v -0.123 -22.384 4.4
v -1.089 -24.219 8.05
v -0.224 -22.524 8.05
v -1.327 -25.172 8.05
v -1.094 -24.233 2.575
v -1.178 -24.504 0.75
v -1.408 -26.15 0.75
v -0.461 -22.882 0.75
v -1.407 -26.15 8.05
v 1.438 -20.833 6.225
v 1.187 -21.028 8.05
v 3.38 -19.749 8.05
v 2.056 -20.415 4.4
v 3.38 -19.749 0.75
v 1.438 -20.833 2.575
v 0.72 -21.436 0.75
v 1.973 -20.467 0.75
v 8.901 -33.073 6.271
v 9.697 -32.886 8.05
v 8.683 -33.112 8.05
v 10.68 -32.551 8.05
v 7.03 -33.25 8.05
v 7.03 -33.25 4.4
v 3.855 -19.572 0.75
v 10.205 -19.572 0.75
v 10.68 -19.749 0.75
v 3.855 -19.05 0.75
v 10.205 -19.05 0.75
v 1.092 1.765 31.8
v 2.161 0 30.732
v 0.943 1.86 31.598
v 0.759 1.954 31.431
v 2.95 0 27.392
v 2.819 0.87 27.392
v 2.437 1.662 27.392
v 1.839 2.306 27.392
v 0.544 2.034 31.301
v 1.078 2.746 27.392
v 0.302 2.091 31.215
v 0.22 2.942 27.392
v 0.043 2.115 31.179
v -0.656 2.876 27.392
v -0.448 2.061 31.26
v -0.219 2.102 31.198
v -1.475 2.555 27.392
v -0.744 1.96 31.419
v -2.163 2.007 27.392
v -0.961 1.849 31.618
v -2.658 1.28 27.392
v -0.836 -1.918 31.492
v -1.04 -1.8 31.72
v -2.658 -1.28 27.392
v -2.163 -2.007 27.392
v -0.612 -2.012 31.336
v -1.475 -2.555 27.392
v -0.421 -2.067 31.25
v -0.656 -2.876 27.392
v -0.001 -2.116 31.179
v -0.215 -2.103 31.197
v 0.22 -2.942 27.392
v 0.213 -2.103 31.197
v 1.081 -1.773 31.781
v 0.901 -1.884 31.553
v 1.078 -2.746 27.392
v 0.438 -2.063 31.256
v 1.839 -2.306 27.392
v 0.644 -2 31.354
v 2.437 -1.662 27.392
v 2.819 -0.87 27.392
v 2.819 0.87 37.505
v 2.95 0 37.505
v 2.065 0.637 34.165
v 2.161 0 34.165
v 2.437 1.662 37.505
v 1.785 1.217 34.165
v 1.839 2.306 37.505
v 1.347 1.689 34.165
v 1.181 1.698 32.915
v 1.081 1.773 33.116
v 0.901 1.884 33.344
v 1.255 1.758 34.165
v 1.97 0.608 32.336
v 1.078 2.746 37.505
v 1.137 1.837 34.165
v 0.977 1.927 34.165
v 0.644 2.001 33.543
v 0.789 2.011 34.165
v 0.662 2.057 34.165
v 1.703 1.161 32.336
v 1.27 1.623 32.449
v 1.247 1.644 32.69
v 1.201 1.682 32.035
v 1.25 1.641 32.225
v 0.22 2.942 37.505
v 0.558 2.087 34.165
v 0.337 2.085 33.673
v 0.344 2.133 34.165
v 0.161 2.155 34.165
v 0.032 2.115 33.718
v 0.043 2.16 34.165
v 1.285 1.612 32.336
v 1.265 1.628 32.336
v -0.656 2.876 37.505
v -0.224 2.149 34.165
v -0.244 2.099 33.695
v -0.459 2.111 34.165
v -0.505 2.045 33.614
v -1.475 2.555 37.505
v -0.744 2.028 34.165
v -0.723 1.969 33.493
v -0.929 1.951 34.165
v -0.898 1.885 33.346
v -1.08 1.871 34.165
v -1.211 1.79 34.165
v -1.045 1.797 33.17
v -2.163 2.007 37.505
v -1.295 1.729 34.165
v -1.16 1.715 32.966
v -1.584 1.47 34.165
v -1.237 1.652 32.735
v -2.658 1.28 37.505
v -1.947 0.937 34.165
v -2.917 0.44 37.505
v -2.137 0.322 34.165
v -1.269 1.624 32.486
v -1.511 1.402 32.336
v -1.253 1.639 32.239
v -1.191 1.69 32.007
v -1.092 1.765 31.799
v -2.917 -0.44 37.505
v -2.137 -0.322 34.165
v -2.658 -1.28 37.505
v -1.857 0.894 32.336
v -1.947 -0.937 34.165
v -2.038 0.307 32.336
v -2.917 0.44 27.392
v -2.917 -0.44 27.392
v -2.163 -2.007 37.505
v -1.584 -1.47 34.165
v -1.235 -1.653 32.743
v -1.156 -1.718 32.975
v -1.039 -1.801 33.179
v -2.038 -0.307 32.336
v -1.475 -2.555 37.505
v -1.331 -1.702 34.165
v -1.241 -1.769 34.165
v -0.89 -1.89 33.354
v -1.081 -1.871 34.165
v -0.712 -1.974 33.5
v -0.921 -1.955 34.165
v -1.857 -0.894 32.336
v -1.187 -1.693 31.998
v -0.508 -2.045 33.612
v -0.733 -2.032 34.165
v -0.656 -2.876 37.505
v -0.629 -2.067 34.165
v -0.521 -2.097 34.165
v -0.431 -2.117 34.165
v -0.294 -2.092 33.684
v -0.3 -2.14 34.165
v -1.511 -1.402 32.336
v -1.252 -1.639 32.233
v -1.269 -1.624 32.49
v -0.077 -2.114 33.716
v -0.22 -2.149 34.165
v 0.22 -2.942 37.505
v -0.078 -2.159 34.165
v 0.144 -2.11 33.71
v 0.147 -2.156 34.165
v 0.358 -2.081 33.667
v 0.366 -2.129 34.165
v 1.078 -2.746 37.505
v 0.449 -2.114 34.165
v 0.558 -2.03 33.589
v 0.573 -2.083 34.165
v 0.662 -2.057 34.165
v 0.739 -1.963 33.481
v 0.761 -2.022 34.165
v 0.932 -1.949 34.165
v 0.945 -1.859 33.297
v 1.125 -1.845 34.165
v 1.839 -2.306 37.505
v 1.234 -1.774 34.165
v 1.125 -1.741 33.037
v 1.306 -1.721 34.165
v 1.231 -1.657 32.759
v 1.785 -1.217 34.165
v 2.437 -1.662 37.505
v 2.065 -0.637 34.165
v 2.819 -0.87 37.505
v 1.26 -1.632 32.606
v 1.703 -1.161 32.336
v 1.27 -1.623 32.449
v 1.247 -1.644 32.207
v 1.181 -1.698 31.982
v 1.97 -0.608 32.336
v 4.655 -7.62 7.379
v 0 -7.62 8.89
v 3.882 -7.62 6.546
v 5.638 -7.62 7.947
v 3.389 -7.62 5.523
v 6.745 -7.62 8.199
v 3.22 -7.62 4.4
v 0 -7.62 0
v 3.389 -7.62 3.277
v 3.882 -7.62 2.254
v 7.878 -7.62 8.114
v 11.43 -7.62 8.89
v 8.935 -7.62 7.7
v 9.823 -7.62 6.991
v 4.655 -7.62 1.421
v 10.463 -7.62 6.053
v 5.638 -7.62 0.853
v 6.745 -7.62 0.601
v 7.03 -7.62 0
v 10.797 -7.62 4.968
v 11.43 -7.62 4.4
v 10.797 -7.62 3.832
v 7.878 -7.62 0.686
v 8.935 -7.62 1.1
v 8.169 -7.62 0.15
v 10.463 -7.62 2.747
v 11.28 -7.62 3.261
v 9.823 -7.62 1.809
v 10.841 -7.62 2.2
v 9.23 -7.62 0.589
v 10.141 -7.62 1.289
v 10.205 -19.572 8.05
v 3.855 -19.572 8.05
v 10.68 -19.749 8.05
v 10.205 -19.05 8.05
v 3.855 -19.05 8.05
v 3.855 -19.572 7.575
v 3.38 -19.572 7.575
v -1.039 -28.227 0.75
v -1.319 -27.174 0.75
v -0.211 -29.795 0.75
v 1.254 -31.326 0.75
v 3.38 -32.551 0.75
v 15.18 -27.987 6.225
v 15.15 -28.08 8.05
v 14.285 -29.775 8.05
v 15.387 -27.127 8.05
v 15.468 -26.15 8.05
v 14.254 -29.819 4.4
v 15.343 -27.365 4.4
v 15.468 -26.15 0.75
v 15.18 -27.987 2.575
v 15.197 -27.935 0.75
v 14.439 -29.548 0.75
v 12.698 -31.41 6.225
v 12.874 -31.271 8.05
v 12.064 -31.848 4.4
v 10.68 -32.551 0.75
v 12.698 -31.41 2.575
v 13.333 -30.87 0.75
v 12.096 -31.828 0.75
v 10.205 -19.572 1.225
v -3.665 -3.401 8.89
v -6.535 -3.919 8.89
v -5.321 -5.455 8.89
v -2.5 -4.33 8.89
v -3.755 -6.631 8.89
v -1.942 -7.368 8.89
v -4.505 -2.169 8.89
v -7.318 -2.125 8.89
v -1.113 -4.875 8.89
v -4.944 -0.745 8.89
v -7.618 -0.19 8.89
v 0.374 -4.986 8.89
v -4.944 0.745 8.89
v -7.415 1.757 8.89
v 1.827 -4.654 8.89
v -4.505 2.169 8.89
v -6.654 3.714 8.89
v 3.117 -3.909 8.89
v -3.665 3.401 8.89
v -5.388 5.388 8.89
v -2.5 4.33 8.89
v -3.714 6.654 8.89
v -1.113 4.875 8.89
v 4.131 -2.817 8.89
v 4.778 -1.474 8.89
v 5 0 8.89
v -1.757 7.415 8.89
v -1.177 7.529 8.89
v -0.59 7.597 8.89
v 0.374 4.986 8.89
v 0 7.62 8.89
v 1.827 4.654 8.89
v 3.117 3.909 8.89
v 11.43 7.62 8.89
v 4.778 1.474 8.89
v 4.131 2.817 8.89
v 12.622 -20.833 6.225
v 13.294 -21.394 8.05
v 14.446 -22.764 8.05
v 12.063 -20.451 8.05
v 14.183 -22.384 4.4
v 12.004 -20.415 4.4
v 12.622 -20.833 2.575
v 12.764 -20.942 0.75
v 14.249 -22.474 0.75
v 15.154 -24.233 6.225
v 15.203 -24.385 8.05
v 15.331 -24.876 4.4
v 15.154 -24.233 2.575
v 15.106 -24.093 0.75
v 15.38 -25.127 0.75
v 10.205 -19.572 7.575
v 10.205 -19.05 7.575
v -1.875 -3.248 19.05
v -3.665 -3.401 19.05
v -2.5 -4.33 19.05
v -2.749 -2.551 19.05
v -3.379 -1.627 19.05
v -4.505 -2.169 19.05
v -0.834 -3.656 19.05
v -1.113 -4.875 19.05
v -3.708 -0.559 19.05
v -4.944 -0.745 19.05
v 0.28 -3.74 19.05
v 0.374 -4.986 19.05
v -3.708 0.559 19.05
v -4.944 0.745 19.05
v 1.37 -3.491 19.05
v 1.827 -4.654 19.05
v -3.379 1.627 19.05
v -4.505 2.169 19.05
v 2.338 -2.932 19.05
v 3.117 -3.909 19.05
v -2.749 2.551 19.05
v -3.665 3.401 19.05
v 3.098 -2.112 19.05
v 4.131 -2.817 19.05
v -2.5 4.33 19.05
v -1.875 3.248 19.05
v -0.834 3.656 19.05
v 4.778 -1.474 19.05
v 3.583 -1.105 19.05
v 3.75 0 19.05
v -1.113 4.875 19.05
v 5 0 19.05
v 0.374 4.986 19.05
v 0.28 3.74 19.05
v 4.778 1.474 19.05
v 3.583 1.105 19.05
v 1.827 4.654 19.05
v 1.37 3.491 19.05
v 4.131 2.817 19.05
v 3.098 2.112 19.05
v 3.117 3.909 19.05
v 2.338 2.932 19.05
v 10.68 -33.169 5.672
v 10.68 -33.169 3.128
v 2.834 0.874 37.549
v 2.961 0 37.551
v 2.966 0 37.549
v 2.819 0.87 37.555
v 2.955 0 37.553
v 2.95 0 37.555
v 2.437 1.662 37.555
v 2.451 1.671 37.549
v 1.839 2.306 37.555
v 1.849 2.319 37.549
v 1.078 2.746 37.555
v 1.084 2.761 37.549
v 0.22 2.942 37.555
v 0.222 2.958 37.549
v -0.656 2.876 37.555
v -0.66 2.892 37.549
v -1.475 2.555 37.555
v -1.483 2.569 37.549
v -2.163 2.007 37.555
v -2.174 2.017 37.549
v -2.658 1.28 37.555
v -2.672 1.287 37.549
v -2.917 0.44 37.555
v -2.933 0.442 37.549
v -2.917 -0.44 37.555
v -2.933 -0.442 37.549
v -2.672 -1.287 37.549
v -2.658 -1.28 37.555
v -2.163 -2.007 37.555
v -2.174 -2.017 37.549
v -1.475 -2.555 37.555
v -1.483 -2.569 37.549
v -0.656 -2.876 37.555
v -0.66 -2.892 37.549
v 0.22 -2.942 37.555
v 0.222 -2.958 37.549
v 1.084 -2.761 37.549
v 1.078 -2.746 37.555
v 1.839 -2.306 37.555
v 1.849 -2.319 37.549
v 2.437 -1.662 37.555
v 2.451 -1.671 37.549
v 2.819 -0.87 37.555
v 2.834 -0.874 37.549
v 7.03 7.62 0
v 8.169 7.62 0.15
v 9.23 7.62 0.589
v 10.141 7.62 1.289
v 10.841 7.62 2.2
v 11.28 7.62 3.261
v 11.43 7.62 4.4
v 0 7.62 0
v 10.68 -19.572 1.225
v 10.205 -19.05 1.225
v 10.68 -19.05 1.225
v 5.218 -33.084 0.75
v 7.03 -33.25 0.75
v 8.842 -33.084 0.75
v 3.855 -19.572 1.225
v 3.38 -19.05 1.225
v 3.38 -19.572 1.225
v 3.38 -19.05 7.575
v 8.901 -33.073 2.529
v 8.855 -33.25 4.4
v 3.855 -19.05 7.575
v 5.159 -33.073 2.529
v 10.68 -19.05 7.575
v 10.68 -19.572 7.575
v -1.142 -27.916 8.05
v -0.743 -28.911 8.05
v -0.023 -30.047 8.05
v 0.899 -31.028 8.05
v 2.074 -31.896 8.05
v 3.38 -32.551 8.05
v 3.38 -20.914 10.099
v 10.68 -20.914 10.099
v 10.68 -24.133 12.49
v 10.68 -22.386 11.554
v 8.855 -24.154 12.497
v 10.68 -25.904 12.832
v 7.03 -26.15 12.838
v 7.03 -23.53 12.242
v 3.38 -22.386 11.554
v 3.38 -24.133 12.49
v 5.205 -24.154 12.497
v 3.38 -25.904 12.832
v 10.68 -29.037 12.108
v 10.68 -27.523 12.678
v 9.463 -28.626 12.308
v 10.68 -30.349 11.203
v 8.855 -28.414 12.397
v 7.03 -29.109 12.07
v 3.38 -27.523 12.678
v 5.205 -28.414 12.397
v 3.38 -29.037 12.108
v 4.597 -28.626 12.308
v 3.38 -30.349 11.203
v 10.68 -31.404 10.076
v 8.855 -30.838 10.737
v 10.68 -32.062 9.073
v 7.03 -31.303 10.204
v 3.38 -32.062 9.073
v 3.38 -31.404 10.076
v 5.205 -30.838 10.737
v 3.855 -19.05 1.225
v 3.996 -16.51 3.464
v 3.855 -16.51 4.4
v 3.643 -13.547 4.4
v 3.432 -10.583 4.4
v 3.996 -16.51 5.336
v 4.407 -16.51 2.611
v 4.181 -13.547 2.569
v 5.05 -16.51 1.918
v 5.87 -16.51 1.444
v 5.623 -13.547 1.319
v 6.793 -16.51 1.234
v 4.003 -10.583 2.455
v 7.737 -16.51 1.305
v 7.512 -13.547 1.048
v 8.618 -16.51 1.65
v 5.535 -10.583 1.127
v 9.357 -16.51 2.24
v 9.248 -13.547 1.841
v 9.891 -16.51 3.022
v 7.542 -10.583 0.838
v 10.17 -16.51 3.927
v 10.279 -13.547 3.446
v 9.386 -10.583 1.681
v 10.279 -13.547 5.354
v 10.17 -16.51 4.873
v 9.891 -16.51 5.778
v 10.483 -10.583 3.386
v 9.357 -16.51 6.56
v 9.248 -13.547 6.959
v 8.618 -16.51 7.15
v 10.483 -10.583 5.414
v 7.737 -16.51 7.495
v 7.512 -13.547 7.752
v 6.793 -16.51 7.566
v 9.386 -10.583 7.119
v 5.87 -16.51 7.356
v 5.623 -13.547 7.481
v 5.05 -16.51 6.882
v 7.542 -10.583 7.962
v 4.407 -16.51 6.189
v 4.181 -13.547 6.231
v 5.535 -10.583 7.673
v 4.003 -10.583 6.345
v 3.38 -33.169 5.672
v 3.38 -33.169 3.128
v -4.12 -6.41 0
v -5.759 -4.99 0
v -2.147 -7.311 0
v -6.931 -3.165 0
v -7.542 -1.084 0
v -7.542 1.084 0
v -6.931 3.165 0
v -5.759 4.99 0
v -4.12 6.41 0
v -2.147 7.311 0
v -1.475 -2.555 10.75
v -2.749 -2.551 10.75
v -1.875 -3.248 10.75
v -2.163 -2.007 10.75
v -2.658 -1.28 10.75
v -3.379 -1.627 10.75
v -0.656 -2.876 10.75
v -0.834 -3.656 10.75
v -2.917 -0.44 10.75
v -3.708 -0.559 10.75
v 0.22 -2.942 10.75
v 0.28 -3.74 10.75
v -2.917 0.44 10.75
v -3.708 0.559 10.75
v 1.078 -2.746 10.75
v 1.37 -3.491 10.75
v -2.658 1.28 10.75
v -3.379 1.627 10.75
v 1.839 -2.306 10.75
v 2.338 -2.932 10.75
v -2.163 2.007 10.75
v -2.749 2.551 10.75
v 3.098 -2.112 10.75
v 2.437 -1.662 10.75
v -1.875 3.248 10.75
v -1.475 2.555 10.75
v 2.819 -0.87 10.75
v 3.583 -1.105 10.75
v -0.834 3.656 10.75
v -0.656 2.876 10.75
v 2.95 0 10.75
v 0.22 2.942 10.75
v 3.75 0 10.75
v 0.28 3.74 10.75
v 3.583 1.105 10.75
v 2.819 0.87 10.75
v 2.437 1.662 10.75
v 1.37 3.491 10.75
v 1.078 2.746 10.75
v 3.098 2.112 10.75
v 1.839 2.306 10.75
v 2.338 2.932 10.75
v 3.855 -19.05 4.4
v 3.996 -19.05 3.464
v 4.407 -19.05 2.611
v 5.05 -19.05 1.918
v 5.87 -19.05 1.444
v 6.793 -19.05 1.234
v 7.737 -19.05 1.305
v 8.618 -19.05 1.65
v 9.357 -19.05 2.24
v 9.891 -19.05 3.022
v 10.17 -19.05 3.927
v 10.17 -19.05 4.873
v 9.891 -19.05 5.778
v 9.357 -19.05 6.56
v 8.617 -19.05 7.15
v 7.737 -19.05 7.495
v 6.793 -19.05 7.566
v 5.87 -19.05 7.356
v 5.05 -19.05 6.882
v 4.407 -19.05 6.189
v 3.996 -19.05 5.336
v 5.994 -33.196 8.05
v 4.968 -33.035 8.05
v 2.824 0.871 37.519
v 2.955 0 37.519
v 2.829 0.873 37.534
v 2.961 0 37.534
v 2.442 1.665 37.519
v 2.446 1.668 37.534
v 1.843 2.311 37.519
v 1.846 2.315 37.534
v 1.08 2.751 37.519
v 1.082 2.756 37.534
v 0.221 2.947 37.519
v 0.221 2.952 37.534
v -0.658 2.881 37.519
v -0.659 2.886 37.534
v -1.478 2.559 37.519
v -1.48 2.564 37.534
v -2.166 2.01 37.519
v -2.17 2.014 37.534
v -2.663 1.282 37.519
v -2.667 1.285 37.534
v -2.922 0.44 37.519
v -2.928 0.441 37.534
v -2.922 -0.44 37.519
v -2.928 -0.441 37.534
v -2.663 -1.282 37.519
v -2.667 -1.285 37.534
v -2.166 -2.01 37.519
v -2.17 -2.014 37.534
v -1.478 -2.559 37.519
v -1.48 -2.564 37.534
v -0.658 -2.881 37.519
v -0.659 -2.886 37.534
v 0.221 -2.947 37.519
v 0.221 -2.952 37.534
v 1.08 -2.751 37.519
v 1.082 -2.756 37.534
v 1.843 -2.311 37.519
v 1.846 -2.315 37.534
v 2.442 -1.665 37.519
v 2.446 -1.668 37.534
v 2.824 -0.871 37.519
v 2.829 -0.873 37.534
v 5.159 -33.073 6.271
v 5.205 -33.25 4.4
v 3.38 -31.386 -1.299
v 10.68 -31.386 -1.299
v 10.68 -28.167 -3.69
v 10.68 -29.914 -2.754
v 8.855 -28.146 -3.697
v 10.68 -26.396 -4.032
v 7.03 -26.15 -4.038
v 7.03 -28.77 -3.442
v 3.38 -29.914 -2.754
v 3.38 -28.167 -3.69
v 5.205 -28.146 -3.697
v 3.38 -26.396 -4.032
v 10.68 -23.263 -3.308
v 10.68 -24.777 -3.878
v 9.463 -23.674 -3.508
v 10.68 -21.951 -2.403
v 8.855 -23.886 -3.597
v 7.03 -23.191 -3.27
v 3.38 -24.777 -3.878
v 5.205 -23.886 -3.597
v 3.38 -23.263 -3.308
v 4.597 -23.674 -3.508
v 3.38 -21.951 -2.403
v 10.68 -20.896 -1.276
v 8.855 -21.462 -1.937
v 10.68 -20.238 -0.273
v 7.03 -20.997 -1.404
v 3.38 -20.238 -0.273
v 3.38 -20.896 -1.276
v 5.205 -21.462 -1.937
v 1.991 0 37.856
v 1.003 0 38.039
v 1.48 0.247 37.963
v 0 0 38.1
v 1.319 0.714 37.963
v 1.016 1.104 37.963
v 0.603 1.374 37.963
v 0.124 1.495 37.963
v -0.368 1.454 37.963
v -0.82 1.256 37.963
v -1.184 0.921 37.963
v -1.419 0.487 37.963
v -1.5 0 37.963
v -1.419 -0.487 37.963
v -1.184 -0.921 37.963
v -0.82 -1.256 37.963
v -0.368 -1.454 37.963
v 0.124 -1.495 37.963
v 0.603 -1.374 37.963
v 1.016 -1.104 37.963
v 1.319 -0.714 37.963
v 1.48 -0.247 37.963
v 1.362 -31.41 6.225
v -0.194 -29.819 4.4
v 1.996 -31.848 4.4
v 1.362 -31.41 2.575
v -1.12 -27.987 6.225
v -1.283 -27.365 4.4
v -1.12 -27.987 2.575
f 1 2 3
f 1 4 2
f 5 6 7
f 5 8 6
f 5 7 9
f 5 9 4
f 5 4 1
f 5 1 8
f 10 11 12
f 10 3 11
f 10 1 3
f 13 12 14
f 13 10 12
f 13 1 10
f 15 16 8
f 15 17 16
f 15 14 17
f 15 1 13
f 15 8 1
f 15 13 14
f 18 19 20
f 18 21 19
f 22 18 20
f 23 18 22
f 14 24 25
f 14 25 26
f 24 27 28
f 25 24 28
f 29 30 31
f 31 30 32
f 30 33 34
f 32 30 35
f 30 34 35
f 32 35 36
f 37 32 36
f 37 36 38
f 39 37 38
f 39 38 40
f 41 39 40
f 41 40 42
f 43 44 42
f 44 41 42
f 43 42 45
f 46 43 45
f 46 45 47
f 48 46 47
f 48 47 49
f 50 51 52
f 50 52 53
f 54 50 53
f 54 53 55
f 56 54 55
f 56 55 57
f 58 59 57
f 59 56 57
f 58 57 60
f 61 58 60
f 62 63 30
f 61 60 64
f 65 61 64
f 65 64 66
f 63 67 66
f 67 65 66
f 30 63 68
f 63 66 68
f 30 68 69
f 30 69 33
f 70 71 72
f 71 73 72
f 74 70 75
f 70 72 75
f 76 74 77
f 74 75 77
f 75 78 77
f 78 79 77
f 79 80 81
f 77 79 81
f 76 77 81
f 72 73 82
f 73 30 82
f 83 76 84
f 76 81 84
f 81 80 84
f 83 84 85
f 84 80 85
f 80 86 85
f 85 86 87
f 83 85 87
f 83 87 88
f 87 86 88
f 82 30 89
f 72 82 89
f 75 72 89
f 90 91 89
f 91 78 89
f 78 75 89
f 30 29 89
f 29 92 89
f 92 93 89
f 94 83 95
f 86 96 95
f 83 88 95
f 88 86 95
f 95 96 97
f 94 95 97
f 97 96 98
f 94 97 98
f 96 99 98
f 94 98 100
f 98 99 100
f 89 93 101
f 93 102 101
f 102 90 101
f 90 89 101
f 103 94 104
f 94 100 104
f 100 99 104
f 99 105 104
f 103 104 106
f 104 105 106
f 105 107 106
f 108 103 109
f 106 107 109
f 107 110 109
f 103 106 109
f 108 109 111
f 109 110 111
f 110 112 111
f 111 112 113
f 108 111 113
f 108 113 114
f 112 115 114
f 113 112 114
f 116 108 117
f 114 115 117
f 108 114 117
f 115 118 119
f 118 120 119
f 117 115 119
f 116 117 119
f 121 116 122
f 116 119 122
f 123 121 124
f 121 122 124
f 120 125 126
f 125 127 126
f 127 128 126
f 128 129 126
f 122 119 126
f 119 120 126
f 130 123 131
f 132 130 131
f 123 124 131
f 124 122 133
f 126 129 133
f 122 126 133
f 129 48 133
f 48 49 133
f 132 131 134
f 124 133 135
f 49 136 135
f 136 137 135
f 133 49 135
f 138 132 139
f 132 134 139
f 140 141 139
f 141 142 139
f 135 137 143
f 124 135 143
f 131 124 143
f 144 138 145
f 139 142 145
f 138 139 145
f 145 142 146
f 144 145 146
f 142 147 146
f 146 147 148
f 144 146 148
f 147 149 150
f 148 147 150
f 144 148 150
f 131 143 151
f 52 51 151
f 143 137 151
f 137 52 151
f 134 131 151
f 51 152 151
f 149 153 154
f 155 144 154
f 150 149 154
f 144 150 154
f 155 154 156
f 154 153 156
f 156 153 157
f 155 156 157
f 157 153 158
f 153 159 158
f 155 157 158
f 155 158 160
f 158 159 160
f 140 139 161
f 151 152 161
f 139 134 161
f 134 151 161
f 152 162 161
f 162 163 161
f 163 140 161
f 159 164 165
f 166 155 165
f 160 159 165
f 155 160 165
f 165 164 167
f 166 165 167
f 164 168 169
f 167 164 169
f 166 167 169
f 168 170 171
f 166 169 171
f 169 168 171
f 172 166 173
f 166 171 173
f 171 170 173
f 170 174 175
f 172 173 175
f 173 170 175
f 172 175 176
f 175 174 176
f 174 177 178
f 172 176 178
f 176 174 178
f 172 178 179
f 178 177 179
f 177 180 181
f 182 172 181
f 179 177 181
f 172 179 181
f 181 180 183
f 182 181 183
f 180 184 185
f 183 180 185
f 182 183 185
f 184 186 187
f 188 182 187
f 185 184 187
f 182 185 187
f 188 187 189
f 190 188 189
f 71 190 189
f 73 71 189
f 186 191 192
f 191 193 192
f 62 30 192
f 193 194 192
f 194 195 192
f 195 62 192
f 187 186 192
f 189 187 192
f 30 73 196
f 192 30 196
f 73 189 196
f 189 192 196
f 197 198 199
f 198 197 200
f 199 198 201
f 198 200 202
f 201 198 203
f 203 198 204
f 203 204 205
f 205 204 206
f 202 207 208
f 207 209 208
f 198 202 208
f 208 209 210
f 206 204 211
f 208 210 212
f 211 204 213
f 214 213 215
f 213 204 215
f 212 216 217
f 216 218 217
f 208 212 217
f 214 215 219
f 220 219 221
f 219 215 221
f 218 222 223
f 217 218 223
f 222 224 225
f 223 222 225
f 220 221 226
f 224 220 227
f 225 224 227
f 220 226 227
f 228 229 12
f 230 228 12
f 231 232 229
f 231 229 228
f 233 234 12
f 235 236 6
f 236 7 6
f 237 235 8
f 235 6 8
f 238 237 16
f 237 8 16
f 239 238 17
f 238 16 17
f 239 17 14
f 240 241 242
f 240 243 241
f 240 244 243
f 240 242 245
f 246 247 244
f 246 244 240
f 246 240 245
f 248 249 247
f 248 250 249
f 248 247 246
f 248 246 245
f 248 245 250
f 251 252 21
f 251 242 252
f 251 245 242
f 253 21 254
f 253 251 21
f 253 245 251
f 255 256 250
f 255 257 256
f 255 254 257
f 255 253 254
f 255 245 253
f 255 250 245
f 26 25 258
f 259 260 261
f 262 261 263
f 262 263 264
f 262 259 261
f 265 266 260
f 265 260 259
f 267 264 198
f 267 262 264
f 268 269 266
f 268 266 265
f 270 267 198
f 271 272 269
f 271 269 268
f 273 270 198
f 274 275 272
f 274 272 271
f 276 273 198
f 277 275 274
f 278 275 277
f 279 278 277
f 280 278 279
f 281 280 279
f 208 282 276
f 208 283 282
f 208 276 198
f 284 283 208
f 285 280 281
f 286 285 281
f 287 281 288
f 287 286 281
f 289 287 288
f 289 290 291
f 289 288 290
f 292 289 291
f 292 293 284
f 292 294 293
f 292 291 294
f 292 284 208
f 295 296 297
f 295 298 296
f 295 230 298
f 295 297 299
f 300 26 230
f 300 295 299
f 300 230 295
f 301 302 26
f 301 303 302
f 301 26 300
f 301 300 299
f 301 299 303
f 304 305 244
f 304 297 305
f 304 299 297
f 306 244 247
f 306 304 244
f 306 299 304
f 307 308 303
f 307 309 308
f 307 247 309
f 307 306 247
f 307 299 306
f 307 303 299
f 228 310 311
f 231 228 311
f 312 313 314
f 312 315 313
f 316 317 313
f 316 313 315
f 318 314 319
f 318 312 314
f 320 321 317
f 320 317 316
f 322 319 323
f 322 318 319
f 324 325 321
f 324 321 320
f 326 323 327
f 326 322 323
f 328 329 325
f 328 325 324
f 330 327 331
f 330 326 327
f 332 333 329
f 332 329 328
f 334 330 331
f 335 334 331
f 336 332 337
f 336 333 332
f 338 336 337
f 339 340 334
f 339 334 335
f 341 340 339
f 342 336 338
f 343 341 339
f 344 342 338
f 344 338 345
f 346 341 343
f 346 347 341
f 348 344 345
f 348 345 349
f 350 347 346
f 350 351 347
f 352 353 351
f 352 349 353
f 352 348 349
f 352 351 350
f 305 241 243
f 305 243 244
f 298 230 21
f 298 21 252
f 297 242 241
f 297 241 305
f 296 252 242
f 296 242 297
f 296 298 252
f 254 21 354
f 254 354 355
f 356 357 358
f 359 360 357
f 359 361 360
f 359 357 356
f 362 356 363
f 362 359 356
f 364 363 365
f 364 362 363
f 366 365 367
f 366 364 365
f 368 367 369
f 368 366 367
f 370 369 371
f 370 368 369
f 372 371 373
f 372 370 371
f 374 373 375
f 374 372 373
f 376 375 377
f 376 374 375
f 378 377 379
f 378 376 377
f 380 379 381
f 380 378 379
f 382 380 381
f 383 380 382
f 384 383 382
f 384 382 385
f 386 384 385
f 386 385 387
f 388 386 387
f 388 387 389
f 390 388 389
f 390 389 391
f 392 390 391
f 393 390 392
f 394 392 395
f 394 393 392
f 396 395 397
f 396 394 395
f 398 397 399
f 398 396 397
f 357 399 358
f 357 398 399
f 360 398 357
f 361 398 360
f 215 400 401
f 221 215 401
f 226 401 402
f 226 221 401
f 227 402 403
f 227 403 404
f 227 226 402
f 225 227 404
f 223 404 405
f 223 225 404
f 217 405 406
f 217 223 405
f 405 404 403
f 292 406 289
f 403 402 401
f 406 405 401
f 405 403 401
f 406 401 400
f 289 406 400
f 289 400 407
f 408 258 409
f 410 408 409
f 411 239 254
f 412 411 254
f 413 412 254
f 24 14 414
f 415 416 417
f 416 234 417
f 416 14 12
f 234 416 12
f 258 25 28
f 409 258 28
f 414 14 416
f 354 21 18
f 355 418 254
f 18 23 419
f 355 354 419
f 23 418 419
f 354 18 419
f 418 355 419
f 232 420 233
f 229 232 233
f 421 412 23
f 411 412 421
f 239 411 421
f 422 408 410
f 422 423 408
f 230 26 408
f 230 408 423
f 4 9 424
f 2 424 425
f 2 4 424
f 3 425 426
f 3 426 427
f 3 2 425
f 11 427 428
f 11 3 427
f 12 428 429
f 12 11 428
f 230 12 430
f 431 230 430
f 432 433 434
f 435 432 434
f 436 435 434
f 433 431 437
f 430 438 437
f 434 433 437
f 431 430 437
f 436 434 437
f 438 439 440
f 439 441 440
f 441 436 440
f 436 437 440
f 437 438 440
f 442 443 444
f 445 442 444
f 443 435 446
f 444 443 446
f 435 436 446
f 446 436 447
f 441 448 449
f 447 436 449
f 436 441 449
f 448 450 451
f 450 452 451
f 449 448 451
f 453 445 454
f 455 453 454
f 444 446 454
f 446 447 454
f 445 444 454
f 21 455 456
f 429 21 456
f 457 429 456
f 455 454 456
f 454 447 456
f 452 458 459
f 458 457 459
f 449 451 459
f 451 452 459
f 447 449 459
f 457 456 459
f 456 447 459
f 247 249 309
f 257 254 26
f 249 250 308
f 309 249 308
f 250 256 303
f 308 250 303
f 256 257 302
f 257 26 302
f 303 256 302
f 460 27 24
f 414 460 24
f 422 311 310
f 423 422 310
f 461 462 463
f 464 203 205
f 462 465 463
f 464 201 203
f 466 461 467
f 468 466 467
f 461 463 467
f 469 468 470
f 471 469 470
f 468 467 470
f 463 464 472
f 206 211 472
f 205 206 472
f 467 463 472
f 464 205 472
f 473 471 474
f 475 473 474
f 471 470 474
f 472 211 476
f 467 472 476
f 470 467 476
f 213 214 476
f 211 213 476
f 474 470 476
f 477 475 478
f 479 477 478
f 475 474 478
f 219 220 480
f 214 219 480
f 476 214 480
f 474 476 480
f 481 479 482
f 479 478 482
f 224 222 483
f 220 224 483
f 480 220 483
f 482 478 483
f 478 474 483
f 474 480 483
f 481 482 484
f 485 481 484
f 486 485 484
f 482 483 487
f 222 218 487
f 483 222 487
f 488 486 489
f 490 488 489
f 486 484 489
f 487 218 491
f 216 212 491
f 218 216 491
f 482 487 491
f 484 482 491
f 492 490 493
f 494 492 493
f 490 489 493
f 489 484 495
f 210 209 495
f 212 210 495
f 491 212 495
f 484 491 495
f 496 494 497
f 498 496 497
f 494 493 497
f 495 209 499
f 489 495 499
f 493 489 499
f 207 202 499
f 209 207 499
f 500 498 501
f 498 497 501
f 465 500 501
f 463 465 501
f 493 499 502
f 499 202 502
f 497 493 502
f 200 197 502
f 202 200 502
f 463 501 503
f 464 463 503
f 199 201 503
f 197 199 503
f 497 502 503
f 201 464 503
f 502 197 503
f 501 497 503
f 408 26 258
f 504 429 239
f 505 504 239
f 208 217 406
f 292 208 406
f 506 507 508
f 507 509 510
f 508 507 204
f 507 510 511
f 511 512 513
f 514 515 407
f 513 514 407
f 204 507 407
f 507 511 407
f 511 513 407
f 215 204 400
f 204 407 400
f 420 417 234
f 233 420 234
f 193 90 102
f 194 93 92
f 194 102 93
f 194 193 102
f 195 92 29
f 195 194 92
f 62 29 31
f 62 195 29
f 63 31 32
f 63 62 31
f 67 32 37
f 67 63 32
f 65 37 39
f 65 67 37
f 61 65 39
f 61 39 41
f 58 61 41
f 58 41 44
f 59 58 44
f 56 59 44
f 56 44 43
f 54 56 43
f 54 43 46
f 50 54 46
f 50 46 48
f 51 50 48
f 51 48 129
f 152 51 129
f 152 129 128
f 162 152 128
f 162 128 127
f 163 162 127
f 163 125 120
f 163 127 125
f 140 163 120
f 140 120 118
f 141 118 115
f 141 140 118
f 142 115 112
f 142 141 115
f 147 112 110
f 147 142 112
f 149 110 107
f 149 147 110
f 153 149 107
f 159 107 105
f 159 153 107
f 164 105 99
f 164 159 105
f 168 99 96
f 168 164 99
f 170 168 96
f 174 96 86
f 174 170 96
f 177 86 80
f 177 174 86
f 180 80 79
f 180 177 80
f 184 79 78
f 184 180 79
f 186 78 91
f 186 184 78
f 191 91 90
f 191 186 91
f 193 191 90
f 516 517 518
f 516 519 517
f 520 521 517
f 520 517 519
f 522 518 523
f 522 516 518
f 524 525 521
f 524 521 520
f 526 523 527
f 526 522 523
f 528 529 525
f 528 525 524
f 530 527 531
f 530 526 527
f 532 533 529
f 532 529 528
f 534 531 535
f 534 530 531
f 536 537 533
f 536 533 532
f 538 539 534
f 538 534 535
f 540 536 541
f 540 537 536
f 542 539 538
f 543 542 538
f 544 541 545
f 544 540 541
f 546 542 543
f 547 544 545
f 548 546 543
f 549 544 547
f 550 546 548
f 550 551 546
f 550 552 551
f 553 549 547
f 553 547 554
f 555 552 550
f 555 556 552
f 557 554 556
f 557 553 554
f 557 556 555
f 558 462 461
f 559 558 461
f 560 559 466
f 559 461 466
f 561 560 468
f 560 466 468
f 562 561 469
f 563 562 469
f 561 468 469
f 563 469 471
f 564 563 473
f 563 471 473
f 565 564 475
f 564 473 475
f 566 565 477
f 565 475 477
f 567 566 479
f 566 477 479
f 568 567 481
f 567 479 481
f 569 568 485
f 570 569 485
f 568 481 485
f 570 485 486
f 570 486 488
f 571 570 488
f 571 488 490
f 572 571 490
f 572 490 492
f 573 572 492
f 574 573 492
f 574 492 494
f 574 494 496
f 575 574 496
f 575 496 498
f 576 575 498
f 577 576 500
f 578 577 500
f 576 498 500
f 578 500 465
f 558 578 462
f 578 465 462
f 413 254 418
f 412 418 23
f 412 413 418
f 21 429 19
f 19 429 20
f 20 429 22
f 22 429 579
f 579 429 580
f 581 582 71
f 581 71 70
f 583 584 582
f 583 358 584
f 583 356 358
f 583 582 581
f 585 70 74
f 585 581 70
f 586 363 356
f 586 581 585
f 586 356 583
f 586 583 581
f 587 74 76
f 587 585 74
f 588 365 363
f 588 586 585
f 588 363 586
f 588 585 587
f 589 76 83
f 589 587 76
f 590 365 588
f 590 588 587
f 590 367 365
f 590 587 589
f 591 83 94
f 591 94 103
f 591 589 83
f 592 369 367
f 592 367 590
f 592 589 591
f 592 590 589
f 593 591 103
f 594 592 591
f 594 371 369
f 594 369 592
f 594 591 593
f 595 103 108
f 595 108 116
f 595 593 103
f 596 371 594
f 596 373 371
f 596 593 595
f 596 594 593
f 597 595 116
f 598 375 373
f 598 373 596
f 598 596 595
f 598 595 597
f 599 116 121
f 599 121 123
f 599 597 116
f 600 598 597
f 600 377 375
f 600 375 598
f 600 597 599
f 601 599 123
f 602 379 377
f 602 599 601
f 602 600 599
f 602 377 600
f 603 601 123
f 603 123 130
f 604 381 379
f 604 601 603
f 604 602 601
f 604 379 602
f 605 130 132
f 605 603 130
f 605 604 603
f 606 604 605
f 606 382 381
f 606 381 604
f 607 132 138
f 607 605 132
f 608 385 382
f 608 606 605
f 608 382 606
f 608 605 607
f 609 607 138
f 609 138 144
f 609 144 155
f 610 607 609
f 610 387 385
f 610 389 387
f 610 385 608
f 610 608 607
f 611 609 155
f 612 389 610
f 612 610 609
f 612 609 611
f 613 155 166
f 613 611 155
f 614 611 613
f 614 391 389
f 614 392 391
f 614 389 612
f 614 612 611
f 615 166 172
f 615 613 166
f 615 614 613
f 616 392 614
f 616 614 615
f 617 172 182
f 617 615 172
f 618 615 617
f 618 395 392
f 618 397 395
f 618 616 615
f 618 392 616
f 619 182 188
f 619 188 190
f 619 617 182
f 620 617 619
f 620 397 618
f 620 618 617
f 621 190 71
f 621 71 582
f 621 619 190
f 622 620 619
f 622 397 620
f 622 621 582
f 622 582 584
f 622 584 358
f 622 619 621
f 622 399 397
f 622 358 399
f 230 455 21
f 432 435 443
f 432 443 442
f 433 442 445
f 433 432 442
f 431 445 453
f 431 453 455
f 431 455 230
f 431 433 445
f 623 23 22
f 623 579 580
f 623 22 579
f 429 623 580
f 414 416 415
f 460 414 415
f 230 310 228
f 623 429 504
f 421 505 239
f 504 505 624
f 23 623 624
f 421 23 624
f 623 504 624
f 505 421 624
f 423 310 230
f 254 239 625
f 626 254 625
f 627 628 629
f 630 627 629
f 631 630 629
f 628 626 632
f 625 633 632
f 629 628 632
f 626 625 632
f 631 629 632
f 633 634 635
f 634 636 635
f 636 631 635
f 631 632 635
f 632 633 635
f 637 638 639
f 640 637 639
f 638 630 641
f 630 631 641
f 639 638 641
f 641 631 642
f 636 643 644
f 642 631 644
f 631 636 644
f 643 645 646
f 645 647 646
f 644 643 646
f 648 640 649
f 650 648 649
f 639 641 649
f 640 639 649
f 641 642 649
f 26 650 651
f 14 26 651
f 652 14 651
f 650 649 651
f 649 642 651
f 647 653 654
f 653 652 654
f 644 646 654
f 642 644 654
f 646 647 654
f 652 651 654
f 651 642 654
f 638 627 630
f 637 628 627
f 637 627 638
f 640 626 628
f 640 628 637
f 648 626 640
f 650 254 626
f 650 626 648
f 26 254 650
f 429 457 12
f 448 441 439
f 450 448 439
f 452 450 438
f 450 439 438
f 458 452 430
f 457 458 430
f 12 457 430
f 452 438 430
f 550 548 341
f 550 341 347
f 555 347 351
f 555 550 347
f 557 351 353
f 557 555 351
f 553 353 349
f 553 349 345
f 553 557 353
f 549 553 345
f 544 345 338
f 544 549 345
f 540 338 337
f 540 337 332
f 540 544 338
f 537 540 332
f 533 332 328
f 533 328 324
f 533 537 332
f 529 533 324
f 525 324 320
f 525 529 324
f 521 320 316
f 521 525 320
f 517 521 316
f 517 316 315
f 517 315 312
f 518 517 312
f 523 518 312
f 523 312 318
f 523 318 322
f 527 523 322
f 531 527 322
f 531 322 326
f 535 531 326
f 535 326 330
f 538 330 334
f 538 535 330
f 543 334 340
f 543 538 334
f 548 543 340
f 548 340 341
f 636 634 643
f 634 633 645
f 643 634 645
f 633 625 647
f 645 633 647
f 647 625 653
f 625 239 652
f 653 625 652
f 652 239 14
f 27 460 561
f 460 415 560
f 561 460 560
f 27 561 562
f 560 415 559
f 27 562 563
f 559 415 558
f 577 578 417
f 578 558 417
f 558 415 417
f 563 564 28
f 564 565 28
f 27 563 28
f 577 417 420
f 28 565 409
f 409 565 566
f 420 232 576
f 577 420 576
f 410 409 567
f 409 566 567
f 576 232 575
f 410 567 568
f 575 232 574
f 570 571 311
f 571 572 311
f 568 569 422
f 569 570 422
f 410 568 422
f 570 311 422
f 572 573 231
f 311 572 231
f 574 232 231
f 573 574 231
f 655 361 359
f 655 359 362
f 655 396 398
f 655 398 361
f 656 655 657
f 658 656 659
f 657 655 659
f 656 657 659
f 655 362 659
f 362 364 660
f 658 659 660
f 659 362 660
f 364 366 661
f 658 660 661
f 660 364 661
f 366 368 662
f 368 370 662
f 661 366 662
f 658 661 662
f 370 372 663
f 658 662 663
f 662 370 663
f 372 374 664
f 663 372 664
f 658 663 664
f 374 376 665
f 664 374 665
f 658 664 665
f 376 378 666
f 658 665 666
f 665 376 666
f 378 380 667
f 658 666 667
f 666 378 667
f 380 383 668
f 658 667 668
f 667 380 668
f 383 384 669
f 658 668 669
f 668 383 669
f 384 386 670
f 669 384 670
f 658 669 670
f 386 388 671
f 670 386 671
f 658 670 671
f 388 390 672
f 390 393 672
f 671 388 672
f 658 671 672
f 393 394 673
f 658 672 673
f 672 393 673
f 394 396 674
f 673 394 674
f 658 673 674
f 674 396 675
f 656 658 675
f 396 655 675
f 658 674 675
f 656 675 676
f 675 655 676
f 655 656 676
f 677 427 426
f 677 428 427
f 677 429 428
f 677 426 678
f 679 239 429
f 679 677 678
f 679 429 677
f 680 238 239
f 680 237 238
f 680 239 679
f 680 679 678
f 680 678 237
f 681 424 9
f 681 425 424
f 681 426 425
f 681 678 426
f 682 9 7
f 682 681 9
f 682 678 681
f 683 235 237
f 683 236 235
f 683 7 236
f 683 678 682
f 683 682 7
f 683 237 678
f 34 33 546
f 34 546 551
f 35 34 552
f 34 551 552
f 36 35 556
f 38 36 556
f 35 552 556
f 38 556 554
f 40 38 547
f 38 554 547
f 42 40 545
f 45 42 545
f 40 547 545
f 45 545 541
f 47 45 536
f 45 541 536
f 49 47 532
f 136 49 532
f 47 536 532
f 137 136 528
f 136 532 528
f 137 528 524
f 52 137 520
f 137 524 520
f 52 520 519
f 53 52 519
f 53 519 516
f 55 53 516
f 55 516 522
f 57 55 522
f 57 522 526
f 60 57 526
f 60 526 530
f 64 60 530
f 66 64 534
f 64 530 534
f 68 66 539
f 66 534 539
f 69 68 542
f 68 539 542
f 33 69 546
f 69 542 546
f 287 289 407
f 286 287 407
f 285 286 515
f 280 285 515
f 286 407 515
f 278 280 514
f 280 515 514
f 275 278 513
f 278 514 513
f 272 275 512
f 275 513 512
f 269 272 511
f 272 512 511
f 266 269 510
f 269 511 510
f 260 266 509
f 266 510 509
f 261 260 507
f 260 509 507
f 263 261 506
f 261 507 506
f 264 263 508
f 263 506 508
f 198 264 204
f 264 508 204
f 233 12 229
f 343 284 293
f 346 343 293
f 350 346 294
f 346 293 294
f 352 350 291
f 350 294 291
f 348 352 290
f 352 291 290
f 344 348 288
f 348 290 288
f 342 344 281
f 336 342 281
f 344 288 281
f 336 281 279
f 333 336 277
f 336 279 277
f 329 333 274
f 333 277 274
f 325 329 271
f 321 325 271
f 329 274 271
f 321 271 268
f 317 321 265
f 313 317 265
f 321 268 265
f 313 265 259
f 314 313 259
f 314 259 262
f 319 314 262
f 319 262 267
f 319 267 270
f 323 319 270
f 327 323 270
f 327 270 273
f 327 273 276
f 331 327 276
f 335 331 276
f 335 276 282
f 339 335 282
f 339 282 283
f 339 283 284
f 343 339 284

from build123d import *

# Parameters (mm, degrees)
MOVE_START             = 1.86
MOVE_FACE1_DEPTH       = 5.08
MOVE_FACE1_2_OUTLINE_R = 5.08
MOVE_FACE1_2_DEPTH     = 19.05
MOVE_FACE1_3_OUTLINE_R = 5.08
MOVE_FACE1_3_DEPTH     = 8.89
MOVE_START_2           = 19.05
MOVE_FACE1_4_OUTLINE_R = 2.95
MOVE_FACE1_4_DEPTH     = 19.05
MOVE_START_3           = 6.731
MOVE_FACE1_5_OUTLINE_R = 1.125
MOVE_FACE1_5_DEPTH     = 2.159
MOVE_START_4           = -7.62
MOVE_FACE1_6_OUTLINE_R = 1.27
MOVE_FACE1_6_DEPTH     = 15.24
MOVE_START_5           = -19.05
MOVE_FACE1_7_OUTLINE_R = 3.81
MOVE_FACE1_7_DEPTH     = 11.43
CUT_EXTRUDE2_START     = -8.3
SKETCH4_R              = 3.75
SKETCH4_R_2            = 2.95
CUT_EXTRUDE2_DEPTH     = 8.3
MOVE_FACE2_BY          = 0.08
SKETCH6_W              = 22.532040778
SKETCH6_H              = 17.162622236
CUT_EXTRUDE3_DEPTH     = 16.1
SKETCH7_W              = 16.875
SKETCH7_H              = 7.3
BOSS_EXTRUDE1_DEPTH    = 14.2
CUT_EXTRUDE4_DEPTH     = 14.2
MOVE_START_6           = 3.38
MOVE_FACE5_DEPTH       = 7.3
CUT_EXTRUDE5_REACH     = 50.258


with BuildPart() as part:
    # Move Face1: read off the stored shape, not the designer's step
    # Move Face1 outline → Move Face1 (new body)
    with BuildSketch(Plane.XY.offset(MOVE_START)):
        with BuildLine():
            ThreePointArc((-3.511, -31.99383827), (7.03, -34.29), (17.571, -31.99383827))
            Line((17.571, -31.99383827), (17.571, -22.753852444))
            Line((17.571, -22.753852444), (11.389315764, -19.05))
            Line((11.389315764, -19.05), (2.670684236, -19.05))
            Line((2.670684236, -19.05), (-3.511, -22.753852444))
            Line((-3.511, -22.753852444), (-3.511, -31.99383827))
        make_face()
        with BuildLine():
            Line((0, -7.62), (11.43, -7.62))
            Line((11.43, -7.62), (11.43, 7.62))
            Line((11.43, 7.62), (0, 7.62))
            ThreePointArc((0, 7.62), (-7.62, 0), (0, -7.62))
        make_face()
    extrude(amount=MOVE_FACE1_DEPTH)

    # Move Face1 2 outline → Move Face1 2 (add)
    with BuildSketch(Plane.XY):
        Circle(MOVE_FACE1_2_OUTLINE_R)
    extrude(amount=MOVE_FACE1_2_DEPTH)

    # Move Face1 3 outline → Move Face1 3 (add)
    with BuildSketch(Plane.XY):
        with BuildLine():
            ThreePointArc((0, 7.62), (-7.62, 0), (0, -7.62))
            Line((0, -7.62), (11.43, -7.62))
            Line((11.43, -7.62), (11.43, 7.62))
            Line((11.43, 7.62), (0, 7.62))
        make_face()
        Circle(MOVE_FACE1_3_OUTLINE_R, mode=Mode.SUBTRACT)
    extrude(amount=MOVE_FACE1_3_DEPTH)

    # Move Face1 4 outline → Move Face1 4 (add)
    with BuildSketch(Plane.XY.offset(MOVE_START_2)):
        Circle(MOVE_FACE1_4_OUTLINE_R)
    extrude(amount=MOVE_FACE1_4_DEPTH)

    # Move Face1 5 outline → Move Face1 5 (add)
    with BuildSketch(Plane.XY.offset(MOVE_START_3)):
        with BuildLine():
            Line((-10.24004056, 5.820733333), (-7.414650266, 1.75708891))
            ThreePointArc((-7.414650266, 1.75708891), (-5.388153673, 5.388153673), (-1.75708891, 7.414650266))
            Line((-1.75708891, 7.414650266), (-5.820733333, 10.24004056))
            ThreePointArc((-5.820733333, 10.24004056), (-9.878281733, 9.878281733), (-10.24004056, 5.820733333))
        make_face()
        with Locations((-7.633217703, 7.633217703)):
            Circle(MOVE_FACE1_5_OUTLINE_R, mode=Mode.SUBTRACT)
    extrude(amount=MOVE_FACE1_5_DEPTH)

    # Move Face1 6 outline → Move Face1 6 (cut)
    with BuildSketch(Plane(origin=(0, 0, 0), x_dir=(1, 0, 0), z_dir=(0, 1, 0)).offset(MOVE_START_4)):
        with BuildLine():
            ThreePointArc((7.03, 0), (10.141269837, -1.288730163), (11.43, -4.4))
            Line((11.43, -4.4), (11.43, 0))
            Line((11.43, 0), (7.03, 0))
        make_face()
        with Locations((0, -32.4485)):
            Circle(MOVE_FACE1_6_OUTLINE_R)
    extrude(amount=MOVE_FACE1_6_DEPTH, mode=Mode.SUBTRACT)

    # Move Face1 7 outline → Move Face1 7 (add)
    with BuildSketch(Plane(origin=(0, 0, 0), x_dir=(1, 0, 0), z_dir=(0, 1, 0)).offset(MOVE_START_5)):
        with Locations((7.03, -4.4)):
            Circle(MOVE_FACE1_7_OUTLINE_R)
    extrude(amount=MOVE_FACE1_7_DEPTH)

    # Move Face1 8 outline → Move Face1 8 (revolve, cut)
    with BuildSketch(Plane.XZ):
        with BuildLine():
            ThreePointArc((0, 38.1), (1.499969695, 37.962580669), (2.95, 37.554897859))
            Line((2.95, 37.554897859), (2.95, 38.1))
            Line((2.95, 38.1), (0, 38.1))
        make_face()
        with BuildLine():
            Line((2.95, 27.392283801), (2.95, 37.504716198))
            ThreePointArc((2.95, 37.504716198), (2.061, 32.448499999), (2.95, 27.392283801))
        make_face()
    revolve(axis=Axis((0, 0, 0), (0, 0, 1)), mode=Mode.SUBTRACT)

    # Move Face1 9 outline → Move Face1 9 (revolve)
    with BuildSketch(Plane.XZ):
        with BuildLine():
            ThreePointArc((2.95, 37.504716198), (2.958008721, 37.526732793), (2.96605223, 37.548736702))
            ThreePointArc((2.96605223, 37.548736702), (2.958027723, 37.551821458), (2.95, 37.554897859))
            Line((2.95, 37.554897859), (2.95, 37.504716198))
        make_face()
    revolve(axis=Axis((0, 0, 0), (0, 0, 1)))

    # Sketch4 → Cut-Extrude2 (cut)
    with BuildSketch(Plane.XY.offset(19.05).offset(CUT_EXTRUDE2_START)):
        Circle(SKETCH4_R)
        Circle(SKETCH4_R_2, mode=Mode.SUBTRACT)
    extrude(amount=CUT_EXTRUDE2_DEPTH, mode=Mode.SUBTRACT)

    # Sketch5 → Cut-Revolve1 (revolve, cut)
    with BuildSketch(Plane(origin=(0, 0, 4.4), x_dir=(-1, 0, 0), z_dir=(0, 0, -1))):
        Polygon((-3.22, -7.62), (-3.22, -19.05), (-3.855, -19.05), (-3.855, -16.51), align=None)
    revolve(axis=Axis((7.03, -7.62, 4.4), (0, -1, 0)), mode=Mode.SUBTRACT)

    # Move Face2: a curved face moved inward by 0.08
    add(Solid.thicken(part.faces().sort_by_distance((-5.08, 0, 13.97))[0], -MOVE_FACE2_BY), mode=Mode.SUBTRACT)

    # Sketch6 → Cut-Extrude3 (cut)
    with BuildSketch(Plane.XY):
        with Locations((7.03, -27.631311118)):
            Rectangle(SKETCH6_W, SKETCH6_H)
    extrude(amount=CUT_EXTRUDE3_DEPTH, mode=Mode.SUBTRACT)

    # Sketch7 → Boss-Extrude1 (add)
    with BuildSketch(Plane.XZ.offset(19.05)):
        with Locations((7.03, 4.4)):
            Rectangle(SKETCH7_W, SKETCH7_H)
    extrude(amount=BOSS_EXTRUDE1_DEPTH)

    # Sketch8 → Cut-Extrude4 (cut)
    with BuildSketch(Plane(origin=(0, 0, 0.75), x_dir=(-1, 0, 0), z_dir=(0, 0, -1))):
        with BuildLine():
            Line((-10.205, -19.571854416), (-10.205, -19.05))
            Line((-10.205, -19.05), (-15.4675, -19.05))
            Line((-15.4675, -19.05), (-15.4675, -26.15))
            add(Edge.make_bspline(
                [(-10.205, -19.571854416), (-15.4675, -21.370400141), (-15.4675, -26.15)],
                knots=[1.956591838, 1.956591838, 1.956591838, 3.141592654, 3.141592654, 3.141592654], degree=2, weights=[1, 0.829546954, 1]))
        make_face()
        with BuildLine():
            Line((1.4075, -19.05), (-3.855, -19.05))
            Line((-3.855, -19.05), (-3.855, -19.571854416))
            add(Edge.make_bspline(
                [(1.4075, -26.15), (1.4075, -21.370400141), (-3.855, -19.571854416)],
                knots=[0, 0, 0, 1.185000816, 1.185000816, 1.185000816], degree=2, weights=[1, 0.829546954, 1]))
            Line((1.4075, -26.15), (1.4075, -19.05))
        make_face()
        with BuildLine():
            add(Edge.make_bspline(
                [(-15.4675, -26.15), (-15.4675, -33.25), (-7.03, -33.25)],
                knots=[3.141592654, 3.141592654, 3.141592654, 4.71238898, 4.71238898, 4.71238898], degree=2, weights=[1, 0.707106781, 1]))
            Line((-15.4675, -26.15), (-15.4675, -33.25))
            Line((-15.4675, -33.25), (-7.03, -33.25))
        make_face()
        with BuildLine():
            Line((1.4075, -33.25), (1.4075, -26.15))
            add(Edge.make_bspline(
                [(-7.03, -33.25), (1.4075, -33.25), (1.4075, -26.15)],
                knots=[4.71238898, 4.71238898, 4.71238898, 6.283185307, 6.283185307, 6.283185307], degree=2, weights=[1, 0.707106781, 1]))
            Line((-7.03, -33.25), (1.4075, -33.25))
        make_face()
    extrude(amount=-CUT_EXTRUDE4_DEPTH, mode=Mode.SUBTRACT)

    # Move Face5: read off the stored shape, not the designer's step
    # Move Face5 outline → Move Face5 (add)
    with BuildSketch(Plane.YZ.offset(MOVE_START_6)):
        with BuildLine():
            Line((-32.551285538, 0.75), (-19.748714462, 0.75))
            add(Edge.make_bspline(
                [(-19.748714462, 0.75), (-19.654129969, 0.984263783), (-19.571854416, 1.225)],
                knots=[1.123429947, 1.123429947, 1.123429947, 1.185000816, 1.185000816, 1.185000816], degree=2, weights=[1, 0.999526166, 1]))
            Line((-19.571854416, 1.225), (-19.05, 1.225))
            Line((-19.05, 1.225), (-19.05, 7.575))
            Line((-19.05, 7.575), (-19.571854416, 7.575))
            add(Edge.make_bspline(
                [(-19.571854416, 7.575), (-19.654129969, 7.815736217), (-19.748714462, 8.05)],
                knots=[1.956591838, 1.956591838, 1.956591838, 2.018162706, 2.018162706, 2.018162706], degree=2, weights=[1, 0.999526166, 1]))
            Line((-19.748714462, 8.05), (-32.551285538, 8.05))
            add(Edge.make_bspline(
                [(-32.551285538, 8.05), (-34.02498069, 4.4), (-32.551285538, 0.75)],
                knots=[4.265022601, 4.265022601, 4.265022601, 5.15975536, 5.15975536, 5.15975536], degree=2, weights=[1, 0.901589512, 1]))
        make_face()
        with BuildLine():
            add(Edge.make_bspline(
                [(-32.551285538, 0.75), (-26.15, -15.104494863), (-19.748714462, 0.75)],
                knots=[5.15975536, 5.15975536, 5.15975536, 7.406615254, 7.406615254, 7.406615254], degree=2, weights=[1, 0.432592593, 1]))
            Line((-19.748714462, 0.75), (-32.551285538, 0.75))
        make_face()
        with BuildLine():
            add(Edge.make_bspline(
                [(-19.748714462, 8.05), (-26.15, 23.904494863), (-32.551285538, 8.05)],
                knots=[2.018162706, 2.018162706, 2.018162706, 4.265022601, 4.265022601, 4.265022601], degree=2, weights=[1, 0.432592593, 1]))
            Line((-32.551285538, 8.05), (-19.748714462, 8.05))
        make_face()
    extrude(amount=MOVE_FACE5_DEPTH)

    # Sketch10 → Cut-Extrude5 (cut, up to next)
    with BuildSketch(Plane(origin=(0, 0, 6.731), x_dir=(-1, 0, 0), z_dir=(0, 0, -1)), mode=Mode.PRIVATE) as cut_extrude5_sk1:
        with BuildLine():
            Line((5.820733333, 10.24004056), (1.75708891, 7.414650266))
            ThreePointArc((1.75708891, 7.414650266), (5.388153673, 5.388153673), (7.414650266, 1.75708891))
            Line((7.414650266, 1.75708891), (10.24004056, 5.820733333))
            ThreePointArc((10.24004056, 5.820733333), (9.878281733, 9.878281733), (5.820733333, 10.24004056))
        make_face()
    cut_extrude5_tool1 = extrude(cut_extrude5_sk1.sketch, amount=-CUT_EXTRUDE5_REACH, mode=Mode.PRIVATE) & part.part
    add(cut_extrude5_tool1.solids().sort_by_distance((-7.209511, 7.209511, 6.731))[0], mode=Mode.SUBTRACT)


solid = part.part
